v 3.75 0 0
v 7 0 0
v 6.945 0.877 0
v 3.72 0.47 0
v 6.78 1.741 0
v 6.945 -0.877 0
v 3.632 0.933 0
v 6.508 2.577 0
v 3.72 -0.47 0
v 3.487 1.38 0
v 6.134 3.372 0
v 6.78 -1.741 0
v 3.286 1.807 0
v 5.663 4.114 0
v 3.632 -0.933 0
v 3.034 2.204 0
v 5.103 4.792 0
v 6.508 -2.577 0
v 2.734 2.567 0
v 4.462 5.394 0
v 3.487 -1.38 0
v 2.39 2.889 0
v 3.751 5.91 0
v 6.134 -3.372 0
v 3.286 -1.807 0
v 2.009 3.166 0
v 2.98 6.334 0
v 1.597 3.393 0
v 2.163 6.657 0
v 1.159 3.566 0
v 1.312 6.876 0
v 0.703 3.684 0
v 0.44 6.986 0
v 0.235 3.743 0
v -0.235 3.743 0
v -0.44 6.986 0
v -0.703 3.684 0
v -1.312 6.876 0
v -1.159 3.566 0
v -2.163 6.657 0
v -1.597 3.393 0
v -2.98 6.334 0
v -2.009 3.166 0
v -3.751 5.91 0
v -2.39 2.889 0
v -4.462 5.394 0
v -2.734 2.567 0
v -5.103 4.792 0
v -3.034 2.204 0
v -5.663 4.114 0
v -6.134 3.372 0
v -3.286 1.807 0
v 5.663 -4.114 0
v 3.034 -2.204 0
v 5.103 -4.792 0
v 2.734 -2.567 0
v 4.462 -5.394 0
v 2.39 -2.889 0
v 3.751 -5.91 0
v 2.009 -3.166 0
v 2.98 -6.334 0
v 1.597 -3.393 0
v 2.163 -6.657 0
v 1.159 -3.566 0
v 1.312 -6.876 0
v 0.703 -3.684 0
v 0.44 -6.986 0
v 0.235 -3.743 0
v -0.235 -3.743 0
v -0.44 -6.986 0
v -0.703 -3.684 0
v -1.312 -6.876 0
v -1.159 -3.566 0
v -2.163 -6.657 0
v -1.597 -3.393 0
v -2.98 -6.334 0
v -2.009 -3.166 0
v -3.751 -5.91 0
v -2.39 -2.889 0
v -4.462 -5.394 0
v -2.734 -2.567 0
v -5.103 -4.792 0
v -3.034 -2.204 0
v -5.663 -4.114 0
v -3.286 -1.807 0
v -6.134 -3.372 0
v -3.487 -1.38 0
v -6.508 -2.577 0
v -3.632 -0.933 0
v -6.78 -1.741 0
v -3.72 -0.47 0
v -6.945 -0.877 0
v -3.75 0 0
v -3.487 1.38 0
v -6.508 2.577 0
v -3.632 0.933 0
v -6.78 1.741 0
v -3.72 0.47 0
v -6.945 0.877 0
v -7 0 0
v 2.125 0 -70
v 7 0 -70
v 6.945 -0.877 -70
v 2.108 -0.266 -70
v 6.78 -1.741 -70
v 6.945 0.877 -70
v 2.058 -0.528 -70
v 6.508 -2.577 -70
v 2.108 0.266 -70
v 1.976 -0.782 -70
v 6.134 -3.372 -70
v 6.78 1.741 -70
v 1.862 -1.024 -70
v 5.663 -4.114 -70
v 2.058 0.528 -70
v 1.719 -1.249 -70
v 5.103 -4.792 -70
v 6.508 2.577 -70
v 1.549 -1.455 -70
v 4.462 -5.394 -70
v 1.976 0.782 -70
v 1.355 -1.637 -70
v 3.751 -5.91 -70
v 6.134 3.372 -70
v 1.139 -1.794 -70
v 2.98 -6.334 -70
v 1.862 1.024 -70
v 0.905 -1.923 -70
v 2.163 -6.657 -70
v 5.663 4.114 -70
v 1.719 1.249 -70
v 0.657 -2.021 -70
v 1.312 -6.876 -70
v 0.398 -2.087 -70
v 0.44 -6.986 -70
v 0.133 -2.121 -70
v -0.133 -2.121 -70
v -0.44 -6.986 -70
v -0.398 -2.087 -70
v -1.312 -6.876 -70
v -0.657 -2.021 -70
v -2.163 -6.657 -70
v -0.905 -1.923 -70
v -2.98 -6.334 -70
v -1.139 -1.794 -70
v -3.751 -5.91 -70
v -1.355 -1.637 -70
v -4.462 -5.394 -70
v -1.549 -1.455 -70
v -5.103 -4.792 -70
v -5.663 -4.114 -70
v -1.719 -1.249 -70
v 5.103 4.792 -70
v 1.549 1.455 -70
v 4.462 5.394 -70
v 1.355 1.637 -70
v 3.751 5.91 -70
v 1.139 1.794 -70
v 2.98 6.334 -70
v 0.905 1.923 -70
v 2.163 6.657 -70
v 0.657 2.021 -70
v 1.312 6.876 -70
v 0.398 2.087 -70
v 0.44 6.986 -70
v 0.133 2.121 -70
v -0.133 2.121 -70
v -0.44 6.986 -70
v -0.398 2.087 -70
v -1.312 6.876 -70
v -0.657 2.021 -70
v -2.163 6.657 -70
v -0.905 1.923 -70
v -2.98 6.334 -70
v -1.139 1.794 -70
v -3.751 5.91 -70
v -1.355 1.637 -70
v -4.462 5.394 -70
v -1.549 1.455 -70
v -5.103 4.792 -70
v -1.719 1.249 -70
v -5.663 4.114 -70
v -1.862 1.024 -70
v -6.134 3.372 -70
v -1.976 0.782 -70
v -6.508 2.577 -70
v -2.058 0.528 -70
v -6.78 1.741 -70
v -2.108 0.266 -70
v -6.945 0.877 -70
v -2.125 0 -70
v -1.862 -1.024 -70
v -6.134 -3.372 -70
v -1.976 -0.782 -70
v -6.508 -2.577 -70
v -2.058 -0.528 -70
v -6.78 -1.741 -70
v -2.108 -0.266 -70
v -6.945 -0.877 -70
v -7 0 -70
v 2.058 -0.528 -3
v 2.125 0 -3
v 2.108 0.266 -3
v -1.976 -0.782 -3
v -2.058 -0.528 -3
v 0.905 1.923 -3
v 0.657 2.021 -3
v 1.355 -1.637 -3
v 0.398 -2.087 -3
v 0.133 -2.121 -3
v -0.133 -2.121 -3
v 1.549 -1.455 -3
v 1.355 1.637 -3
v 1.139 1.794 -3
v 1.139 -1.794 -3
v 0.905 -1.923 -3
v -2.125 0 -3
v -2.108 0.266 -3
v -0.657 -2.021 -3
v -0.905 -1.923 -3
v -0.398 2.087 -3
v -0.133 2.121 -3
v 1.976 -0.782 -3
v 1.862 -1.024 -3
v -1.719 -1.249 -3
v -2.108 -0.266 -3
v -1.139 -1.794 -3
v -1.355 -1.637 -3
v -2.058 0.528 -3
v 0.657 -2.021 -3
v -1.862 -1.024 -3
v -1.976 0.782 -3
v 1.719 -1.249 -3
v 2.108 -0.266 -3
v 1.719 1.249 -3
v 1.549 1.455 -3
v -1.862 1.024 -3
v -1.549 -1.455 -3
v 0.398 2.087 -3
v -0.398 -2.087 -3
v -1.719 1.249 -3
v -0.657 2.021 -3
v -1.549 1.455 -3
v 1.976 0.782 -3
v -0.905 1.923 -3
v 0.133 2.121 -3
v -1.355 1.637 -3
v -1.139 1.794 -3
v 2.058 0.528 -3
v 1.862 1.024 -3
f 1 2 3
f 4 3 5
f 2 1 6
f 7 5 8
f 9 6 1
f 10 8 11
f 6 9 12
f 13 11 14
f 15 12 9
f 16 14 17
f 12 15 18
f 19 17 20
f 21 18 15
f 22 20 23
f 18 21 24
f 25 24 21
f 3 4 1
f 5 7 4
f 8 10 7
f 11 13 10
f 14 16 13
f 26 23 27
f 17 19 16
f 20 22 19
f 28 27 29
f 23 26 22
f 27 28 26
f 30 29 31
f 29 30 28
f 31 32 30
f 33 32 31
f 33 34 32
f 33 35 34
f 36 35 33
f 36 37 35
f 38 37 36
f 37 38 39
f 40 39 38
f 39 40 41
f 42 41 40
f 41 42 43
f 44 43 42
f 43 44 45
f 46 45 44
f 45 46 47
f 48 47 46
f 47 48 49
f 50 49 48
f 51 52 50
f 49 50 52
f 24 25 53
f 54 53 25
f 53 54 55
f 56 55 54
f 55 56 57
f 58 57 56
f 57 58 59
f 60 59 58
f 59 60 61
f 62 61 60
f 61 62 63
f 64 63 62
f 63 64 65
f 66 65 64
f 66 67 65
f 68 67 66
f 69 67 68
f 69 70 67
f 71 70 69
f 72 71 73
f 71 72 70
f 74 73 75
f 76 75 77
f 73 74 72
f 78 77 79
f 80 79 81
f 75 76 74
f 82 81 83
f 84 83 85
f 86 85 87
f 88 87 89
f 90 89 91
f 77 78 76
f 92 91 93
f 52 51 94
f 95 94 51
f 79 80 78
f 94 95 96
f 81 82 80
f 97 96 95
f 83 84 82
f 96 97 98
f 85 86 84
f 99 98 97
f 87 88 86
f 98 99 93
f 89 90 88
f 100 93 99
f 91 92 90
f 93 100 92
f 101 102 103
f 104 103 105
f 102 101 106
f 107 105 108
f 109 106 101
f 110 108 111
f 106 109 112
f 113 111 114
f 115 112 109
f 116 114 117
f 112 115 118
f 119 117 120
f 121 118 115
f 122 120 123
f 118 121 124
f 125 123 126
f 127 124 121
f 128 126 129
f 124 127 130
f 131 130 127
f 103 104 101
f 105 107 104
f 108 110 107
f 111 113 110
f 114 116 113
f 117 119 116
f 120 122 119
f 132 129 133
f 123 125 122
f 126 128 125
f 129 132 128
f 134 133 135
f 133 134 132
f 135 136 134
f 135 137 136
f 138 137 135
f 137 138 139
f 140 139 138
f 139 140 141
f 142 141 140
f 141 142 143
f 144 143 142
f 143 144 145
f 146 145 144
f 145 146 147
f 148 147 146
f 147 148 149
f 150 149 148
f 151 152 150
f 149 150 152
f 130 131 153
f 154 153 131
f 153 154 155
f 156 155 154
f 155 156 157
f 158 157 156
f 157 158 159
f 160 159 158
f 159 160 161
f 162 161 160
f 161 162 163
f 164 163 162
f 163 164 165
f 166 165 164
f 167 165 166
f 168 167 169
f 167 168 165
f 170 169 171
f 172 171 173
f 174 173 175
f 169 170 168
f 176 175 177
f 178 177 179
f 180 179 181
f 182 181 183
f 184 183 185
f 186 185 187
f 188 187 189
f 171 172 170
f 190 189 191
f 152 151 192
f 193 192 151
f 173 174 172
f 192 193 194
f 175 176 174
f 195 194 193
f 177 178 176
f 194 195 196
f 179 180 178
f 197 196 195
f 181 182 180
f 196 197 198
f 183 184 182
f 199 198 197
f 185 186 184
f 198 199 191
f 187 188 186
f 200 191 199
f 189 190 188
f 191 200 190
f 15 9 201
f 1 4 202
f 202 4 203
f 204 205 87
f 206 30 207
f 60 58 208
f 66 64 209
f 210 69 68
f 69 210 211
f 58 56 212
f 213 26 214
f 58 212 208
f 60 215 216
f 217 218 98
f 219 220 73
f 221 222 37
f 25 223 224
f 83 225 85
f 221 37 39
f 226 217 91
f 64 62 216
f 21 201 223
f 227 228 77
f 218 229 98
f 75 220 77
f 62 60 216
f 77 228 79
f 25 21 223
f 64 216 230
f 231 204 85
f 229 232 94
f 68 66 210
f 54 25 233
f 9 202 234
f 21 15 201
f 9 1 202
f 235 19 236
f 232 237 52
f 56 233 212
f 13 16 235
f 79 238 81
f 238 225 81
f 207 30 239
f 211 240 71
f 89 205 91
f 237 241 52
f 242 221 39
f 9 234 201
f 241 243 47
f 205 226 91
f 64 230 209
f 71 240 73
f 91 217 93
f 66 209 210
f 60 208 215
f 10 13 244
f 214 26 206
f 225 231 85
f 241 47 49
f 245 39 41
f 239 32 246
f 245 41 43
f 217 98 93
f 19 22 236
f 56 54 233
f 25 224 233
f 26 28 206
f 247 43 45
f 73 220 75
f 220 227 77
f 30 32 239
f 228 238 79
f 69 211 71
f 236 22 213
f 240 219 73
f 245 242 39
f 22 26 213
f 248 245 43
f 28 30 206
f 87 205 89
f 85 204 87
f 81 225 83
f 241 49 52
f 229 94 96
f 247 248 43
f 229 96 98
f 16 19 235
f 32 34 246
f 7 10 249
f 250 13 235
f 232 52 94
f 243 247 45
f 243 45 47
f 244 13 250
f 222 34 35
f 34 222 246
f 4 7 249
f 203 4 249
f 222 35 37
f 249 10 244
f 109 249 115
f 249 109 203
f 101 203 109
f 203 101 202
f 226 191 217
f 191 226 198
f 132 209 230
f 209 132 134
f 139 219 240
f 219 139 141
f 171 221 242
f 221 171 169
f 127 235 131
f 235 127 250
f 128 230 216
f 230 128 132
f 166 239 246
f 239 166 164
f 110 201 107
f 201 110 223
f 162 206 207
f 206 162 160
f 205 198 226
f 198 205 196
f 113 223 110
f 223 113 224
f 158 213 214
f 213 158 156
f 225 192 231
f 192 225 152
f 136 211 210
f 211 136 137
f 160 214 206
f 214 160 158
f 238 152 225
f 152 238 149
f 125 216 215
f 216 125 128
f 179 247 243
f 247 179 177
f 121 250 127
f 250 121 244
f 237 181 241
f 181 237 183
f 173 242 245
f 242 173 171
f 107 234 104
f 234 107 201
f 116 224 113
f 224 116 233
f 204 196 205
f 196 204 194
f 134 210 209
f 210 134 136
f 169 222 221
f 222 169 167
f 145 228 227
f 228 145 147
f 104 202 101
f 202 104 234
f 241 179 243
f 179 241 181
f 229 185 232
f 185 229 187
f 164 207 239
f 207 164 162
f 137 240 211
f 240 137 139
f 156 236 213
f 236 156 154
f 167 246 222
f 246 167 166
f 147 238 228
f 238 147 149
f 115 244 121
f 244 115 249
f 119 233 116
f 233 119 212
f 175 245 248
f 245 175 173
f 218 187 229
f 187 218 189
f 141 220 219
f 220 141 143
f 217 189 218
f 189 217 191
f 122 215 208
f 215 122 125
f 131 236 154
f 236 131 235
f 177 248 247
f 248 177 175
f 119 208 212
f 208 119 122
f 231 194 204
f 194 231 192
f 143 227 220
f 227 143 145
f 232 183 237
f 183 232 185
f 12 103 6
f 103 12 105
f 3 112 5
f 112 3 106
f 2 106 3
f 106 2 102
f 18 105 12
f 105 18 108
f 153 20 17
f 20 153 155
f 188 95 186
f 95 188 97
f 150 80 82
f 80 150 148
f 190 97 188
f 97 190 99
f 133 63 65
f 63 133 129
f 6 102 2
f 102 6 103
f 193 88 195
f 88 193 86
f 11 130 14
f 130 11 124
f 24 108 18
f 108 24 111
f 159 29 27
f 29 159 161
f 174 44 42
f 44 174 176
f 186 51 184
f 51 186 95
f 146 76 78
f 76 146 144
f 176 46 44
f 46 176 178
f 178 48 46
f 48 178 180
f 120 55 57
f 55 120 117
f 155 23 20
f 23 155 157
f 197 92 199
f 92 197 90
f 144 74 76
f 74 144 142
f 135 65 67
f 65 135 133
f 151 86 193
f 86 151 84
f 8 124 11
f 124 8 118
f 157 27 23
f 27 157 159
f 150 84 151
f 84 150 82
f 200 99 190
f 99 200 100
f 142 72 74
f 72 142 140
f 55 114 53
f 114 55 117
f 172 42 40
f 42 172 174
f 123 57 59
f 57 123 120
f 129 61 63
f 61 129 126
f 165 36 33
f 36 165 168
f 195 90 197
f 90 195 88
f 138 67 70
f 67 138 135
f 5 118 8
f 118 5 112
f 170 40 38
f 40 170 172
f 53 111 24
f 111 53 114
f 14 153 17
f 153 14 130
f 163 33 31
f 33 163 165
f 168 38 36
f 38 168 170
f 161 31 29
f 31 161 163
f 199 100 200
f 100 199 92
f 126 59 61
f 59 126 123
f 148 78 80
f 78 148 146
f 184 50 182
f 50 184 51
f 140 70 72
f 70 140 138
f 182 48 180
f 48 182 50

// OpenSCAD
$fn = 50;


difference() {
	union() {
		translate(v = [0, 0, -70.0000000000]) {
			cylinder(h = 70, r = 7.0000000000);
		}
		cylinder(h = 0, r = 16.0000000000);
	}
	union() {
		translate(v = [0, 0, 0]) {
			rotate(a = [0, 0, 0]) {
				difference() {
					union() {
						#translate(v = [0, 0, -70.0000000000]) {
							cylinder(h = 70, r = 2.0000000000);
						}
						#translate(v = [0, 0, -3]) {
							cylinder(h = 3, r = 7.0000000000, r1 = 2.1250000000, r2 = 3.7500000000);
						}
						#translate(v = [0, 0, -70.0000000000]) {
							cylinder(h = 70, r = 2.1250000000);
						}
						#translate(v = [0, 0, -70.0000000000]) {
							cylinder(h = 70, r = 2.0000000000);
						}
					}
					union();
				}
			}
		}
	}
}
